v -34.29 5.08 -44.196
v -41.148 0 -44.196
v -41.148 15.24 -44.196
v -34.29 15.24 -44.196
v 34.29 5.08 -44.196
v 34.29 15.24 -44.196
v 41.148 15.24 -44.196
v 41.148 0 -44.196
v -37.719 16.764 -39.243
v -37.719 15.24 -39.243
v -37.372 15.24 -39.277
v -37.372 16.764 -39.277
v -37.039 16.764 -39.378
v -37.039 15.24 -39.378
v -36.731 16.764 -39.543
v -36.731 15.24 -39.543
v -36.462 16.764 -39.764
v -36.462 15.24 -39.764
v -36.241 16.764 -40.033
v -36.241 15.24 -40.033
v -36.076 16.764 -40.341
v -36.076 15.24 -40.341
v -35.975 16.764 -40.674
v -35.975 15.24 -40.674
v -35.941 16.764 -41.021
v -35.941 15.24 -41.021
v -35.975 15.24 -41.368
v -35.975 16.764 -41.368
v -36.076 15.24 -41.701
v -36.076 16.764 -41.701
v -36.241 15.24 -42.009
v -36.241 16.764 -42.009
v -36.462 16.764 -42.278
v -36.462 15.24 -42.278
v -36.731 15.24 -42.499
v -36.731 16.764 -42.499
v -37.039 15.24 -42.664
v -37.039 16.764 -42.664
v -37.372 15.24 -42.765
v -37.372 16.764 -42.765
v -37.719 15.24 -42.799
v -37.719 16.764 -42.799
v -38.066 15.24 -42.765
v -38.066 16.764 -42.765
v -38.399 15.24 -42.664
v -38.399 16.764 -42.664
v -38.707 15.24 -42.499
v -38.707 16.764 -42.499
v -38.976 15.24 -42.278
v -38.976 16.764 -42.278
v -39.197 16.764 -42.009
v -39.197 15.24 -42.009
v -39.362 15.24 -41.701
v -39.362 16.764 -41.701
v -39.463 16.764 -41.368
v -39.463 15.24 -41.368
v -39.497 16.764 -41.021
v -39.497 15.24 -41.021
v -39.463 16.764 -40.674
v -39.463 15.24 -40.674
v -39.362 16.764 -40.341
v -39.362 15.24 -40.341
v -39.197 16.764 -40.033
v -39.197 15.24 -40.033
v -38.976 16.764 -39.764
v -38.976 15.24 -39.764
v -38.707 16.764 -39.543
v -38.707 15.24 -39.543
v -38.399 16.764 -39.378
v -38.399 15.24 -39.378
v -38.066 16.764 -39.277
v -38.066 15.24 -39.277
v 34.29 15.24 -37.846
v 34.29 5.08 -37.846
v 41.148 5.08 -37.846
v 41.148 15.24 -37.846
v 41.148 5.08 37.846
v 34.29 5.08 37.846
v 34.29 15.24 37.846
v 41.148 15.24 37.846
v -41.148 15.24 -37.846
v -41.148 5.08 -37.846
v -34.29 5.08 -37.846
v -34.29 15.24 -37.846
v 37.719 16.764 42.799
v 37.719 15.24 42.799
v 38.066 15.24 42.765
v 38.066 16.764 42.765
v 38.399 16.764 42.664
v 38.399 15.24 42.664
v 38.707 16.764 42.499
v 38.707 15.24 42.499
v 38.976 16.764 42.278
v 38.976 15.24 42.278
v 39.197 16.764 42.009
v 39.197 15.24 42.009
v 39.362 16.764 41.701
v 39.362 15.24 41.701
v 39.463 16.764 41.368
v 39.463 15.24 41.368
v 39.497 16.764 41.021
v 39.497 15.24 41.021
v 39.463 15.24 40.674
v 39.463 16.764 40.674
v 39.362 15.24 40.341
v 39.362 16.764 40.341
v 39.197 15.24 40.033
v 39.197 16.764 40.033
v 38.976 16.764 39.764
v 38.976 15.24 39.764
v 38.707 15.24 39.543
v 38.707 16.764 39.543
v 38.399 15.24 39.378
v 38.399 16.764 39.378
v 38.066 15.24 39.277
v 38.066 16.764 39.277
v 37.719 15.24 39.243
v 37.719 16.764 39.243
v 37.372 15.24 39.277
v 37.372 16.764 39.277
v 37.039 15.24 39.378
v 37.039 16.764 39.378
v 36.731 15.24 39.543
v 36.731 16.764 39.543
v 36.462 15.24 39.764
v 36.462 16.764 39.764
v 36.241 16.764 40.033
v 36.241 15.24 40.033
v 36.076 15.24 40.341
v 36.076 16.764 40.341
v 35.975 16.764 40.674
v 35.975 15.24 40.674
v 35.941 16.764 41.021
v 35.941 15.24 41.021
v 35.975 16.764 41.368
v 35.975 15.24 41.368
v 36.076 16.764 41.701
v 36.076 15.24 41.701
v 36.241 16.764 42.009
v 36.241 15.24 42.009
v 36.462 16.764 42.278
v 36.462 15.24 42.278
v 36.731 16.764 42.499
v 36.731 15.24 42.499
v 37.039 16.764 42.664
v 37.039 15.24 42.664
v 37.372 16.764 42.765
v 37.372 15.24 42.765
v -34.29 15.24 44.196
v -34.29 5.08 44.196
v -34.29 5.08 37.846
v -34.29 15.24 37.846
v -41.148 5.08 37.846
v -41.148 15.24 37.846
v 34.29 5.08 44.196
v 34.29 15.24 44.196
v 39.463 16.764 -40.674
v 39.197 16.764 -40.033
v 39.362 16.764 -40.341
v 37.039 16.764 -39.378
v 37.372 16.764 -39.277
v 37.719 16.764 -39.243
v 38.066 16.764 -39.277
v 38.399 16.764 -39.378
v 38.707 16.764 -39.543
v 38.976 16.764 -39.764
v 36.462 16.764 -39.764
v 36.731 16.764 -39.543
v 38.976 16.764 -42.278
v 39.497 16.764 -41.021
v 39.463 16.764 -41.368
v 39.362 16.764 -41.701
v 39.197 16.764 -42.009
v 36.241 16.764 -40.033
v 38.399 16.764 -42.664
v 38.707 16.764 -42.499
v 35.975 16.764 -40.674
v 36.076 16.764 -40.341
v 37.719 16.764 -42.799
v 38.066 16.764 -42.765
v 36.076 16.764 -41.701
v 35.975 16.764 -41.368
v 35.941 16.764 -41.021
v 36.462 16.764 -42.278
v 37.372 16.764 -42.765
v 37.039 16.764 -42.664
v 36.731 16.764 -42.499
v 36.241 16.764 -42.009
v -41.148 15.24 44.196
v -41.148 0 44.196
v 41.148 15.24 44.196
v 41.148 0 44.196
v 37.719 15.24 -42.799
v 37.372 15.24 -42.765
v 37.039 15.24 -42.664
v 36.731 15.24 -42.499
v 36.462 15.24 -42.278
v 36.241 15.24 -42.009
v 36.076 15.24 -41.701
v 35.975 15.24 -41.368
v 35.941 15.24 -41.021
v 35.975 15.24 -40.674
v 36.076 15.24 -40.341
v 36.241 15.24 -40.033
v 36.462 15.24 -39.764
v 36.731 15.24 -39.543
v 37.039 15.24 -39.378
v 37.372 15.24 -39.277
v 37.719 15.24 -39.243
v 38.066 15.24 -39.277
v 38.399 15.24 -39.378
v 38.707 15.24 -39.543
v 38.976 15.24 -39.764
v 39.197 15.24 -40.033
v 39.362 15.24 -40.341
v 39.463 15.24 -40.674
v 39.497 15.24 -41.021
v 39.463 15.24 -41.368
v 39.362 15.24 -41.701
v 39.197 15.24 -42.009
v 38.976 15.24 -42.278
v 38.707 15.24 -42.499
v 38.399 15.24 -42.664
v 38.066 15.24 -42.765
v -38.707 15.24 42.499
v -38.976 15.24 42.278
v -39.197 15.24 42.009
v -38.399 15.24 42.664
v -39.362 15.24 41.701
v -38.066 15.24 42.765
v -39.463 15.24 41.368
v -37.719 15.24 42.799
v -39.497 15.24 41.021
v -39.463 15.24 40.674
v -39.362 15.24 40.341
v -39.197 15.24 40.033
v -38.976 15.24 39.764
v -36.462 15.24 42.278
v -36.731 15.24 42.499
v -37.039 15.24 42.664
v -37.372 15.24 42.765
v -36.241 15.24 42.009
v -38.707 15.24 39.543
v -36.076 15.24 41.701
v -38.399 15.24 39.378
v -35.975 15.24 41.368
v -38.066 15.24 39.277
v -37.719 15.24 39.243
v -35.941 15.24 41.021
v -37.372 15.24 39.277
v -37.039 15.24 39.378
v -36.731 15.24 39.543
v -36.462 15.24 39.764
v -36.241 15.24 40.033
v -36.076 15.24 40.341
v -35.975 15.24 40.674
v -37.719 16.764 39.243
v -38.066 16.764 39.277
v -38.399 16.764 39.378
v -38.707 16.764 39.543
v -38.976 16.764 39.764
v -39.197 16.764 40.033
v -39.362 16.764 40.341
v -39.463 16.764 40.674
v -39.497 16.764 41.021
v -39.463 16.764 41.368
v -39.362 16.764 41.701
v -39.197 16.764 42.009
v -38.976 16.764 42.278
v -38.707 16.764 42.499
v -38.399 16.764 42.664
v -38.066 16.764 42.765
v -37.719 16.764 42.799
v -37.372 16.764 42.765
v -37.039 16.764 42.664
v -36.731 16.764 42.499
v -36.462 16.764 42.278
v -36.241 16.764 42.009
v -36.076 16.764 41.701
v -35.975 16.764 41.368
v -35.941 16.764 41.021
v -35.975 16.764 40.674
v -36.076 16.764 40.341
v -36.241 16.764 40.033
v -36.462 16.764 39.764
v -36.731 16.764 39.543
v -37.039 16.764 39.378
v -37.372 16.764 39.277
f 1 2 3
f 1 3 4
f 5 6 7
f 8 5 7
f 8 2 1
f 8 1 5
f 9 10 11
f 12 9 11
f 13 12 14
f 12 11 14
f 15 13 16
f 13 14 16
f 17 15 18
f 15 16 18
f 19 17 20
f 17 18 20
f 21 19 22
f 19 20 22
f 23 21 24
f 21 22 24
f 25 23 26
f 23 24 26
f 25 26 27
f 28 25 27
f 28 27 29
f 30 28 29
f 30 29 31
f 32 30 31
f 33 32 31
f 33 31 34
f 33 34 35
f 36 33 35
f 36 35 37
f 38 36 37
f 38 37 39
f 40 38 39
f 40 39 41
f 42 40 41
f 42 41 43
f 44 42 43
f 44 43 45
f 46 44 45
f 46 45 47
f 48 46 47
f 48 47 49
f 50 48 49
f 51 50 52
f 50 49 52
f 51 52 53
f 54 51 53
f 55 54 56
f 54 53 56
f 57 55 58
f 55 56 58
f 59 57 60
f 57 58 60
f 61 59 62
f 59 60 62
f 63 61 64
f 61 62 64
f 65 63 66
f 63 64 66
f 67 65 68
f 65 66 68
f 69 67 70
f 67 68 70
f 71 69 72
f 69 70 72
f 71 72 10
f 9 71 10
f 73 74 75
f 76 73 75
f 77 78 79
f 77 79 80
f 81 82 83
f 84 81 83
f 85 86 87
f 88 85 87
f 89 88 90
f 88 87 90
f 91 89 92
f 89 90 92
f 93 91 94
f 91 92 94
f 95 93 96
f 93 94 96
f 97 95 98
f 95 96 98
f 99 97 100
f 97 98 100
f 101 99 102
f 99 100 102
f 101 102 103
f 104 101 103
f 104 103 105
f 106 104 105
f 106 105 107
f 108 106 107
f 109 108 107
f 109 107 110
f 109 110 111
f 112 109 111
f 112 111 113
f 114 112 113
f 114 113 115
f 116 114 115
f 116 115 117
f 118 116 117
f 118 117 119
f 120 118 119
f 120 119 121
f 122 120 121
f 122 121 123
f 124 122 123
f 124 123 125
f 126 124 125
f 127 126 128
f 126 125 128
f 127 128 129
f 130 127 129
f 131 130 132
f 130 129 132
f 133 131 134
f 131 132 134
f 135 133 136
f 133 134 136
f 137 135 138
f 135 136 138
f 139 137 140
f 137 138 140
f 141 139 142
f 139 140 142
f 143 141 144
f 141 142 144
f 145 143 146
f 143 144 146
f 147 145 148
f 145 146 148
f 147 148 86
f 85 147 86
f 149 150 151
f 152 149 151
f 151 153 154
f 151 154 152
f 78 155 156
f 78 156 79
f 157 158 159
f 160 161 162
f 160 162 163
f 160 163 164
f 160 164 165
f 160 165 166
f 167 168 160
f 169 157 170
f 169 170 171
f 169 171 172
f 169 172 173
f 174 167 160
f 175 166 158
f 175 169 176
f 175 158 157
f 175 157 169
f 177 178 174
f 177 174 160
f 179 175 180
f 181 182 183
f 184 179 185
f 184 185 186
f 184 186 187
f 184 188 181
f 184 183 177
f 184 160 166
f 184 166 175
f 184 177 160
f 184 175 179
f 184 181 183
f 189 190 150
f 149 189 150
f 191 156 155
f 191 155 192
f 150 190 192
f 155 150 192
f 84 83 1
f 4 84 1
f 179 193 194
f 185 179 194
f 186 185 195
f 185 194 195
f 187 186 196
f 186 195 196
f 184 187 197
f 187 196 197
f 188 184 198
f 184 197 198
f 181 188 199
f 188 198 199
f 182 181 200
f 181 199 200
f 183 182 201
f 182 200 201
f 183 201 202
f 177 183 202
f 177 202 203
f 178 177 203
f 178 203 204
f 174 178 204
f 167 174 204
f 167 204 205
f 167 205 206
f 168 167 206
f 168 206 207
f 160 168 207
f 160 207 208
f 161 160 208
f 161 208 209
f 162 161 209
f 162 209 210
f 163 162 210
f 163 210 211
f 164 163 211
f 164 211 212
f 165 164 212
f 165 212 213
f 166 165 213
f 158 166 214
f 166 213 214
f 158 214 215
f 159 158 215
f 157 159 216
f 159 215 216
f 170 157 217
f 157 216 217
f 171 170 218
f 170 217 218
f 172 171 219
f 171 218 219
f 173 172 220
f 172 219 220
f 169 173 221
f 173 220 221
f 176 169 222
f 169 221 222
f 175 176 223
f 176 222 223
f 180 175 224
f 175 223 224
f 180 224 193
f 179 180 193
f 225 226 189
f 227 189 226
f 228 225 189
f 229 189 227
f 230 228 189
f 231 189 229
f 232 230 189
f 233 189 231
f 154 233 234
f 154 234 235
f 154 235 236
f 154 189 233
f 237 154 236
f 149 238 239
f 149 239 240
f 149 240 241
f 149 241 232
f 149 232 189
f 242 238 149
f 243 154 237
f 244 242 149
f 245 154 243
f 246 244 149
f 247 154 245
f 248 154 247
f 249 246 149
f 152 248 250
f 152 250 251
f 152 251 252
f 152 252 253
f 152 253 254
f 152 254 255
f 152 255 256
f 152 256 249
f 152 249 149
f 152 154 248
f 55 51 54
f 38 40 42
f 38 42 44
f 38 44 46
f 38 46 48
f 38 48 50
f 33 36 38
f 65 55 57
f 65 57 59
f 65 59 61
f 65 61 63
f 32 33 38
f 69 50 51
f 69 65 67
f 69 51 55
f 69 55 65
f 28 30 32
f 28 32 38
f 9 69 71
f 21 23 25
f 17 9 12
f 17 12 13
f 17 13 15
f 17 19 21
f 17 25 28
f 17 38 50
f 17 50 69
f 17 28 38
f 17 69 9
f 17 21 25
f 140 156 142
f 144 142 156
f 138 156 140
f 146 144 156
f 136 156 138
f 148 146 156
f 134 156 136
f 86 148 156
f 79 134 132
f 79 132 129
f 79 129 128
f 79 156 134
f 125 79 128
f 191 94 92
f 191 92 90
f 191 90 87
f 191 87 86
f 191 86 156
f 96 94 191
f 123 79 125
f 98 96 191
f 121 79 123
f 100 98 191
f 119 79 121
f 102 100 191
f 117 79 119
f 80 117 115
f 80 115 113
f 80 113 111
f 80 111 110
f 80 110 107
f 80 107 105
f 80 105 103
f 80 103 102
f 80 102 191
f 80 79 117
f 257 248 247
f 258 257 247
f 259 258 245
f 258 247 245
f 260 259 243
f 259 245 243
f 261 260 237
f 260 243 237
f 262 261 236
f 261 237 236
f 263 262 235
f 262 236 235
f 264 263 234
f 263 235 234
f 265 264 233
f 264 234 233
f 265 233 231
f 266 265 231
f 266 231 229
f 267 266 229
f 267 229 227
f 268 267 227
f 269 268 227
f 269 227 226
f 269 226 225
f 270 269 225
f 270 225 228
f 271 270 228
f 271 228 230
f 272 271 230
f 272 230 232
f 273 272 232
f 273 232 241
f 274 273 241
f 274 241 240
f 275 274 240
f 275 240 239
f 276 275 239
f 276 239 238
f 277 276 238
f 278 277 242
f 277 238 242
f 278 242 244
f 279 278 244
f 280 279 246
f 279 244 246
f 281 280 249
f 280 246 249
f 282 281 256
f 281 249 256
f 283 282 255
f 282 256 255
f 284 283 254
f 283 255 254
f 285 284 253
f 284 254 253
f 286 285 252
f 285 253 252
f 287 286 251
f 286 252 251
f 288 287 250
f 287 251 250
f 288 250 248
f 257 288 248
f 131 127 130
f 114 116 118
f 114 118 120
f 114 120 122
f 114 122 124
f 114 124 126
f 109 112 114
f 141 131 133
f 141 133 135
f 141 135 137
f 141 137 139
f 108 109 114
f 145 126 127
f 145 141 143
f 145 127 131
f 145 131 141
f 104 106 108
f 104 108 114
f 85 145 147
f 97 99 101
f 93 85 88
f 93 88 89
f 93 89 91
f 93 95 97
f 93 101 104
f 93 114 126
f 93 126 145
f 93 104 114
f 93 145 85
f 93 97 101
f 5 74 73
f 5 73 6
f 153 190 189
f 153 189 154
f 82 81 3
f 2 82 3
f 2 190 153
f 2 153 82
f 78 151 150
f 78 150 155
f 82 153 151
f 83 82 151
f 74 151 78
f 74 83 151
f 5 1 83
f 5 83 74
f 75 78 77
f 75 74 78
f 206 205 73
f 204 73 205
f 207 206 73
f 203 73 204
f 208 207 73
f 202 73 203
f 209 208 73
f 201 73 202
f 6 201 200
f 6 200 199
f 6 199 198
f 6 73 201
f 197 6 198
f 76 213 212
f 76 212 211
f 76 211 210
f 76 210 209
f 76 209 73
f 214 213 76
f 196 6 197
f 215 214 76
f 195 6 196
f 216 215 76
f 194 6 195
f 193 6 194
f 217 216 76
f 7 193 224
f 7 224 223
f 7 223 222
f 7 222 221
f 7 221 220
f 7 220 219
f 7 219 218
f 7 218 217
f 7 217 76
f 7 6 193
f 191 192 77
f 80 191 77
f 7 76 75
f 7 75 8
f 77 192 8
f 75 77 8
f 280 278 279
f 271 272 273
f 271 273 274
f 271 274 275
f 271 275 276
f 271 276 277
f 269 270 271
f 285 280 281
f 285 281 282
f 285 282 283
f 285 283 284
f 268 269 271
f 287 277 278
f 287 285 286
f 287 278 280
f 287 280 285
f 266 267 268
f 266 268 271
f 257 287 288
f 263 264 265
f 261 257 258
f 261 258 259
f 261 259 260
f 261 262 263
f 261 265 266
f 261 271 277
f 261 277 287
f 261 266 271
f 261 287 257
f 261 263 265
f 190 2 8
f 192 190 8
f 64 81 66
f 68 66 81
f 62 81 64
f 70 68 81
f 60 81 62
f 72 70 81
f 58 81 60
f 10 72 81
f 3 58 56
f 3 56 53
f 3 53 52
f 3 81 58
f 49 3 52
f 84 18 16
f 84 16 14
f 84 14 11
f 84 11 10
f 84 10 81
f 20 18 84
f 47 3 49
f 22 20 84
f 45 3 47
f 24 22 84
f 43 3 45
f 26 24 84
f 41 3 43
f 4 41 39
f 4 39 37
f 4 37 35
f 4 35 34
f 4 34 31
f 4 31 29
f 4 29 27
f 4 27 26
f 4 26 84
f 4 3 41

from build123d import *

# Parameters (mm, degrees)
SKETCH2_R             = 1.778
BOSS_EXTRUDE2_DEPTH   = 16.764
BOSS_EXTRUDE2_2_DEPTH = 16.764
BOSS_EXTRUDE2_3_DEPTH = 16.764
BOSS_EXTRUDE2_4_DEPTH = 16.764
SKETCH2_4_W           = 82.296
SKETCH2_4_H           = 88.392
BOSS_EXTRUDE3_DEPTH   = 5.08
SKETCH5_W             = 6.858
SKETCH5_H             = 6.35
BOSS_EXTRUDE4_DEPTH   = 10.16


with BuildPart() as part:
    # Sketch2 → Boss-Extrude2 (new body)
    with BuildSketch(Plane(origin=(0, 0, 0), x_dir=(1, 0, 0), z_dir=(0, 1, 0))):
        with Locations((37.719, -41.021)):
            Circle(SKETCH2_R)
    extrude(amount=BOSS_EXTRUDE2_DEPTH)



with BuildPart() as body_2:
    # Sketch2 → Boss-Extrude2 2 (new body)
    with BuildSketch(Plane(origin=(0, 0, 0), x_dir=(1, 0, 0), z_dir=(0, 1, 0))):
        with Locations((-37.719, -41.021)):
            Circle(SKETCH2_R)
    extrude(amount=BOSS_EXTRUDE2_2_DEPTH)


with BuildPart() as body_3:
    # Sketch2 → Boss-Extrude2 3 (new body)
    with BuildSketch(Plane(origin=(0, 0, 0), x_dir=(1, 0, 0), z_dir=(0, 1, 0))):
        with Locations((37.719, 41.021)):
            Circle(SKETCH2_R)
    extrude(amount=BOSS_EXTRUDE2_3_DEPTH)


with BuildPart() as body_4:
    # Sketch2 → Boss-Extrude2 4 (new body)
    with BuildSketch(Plane(origin=(0, 0, 0), x_dir=(1, 0, 0), z_dir=(0, 1, 0))):
        with Locations((-37.719, 41.021)):
            Circle(SKETCH2_R)
    extrude(amount=BOSS_EXTRUDE2_4_DEPTH)


with BuildPart() as part_1:
    add(part.part)

    add(body_2.part)  # Boss-Extrude3 merges body 2

    add(body_3.part)  # Boss-Extrude3 merges body 3

    add(body_4.part)  # Boss-Extrude3 merges body 4
    # Sketch2<4> → Boss-Extrude3 (add)
    with BuildSketch(Plane(origin=(0, 0, 0), x_dir=(1, 0, 0), z_dir=(0, 1, 0))):
        Rectangle(SKETCH2_4_W, SKETCH2_4_H)
    extrude(amount=BOSS_EXTRUDE3_DEPTH)

    # Sketch5 → Boss-Extrude4 (add)
    with BuildSketch(Plane(origin=(0, 5.08, 0), x_dir=(1, 0, 0), z_dir=(0, 1, 0))):
        with Locations((-37.719, 41.021)):
            Rectangle(SKETCH5_W, SKETCH5_H)
        with Locations((37.719, -41.021)):
            Rectangle(SKETCH5_W, SKETCH5_H)
        with Locations((-37.719, -41.021)):
            Rectangle(SKETCH5_W, SKETCH5_H)
        with Locations((37.719, 41.021)):
            Rectangle(SKETCH5_W, SKETCH5_H)
    extrude(amount=BOSS_EXTRUDE4_DEPTH)


solid = part_1.part
